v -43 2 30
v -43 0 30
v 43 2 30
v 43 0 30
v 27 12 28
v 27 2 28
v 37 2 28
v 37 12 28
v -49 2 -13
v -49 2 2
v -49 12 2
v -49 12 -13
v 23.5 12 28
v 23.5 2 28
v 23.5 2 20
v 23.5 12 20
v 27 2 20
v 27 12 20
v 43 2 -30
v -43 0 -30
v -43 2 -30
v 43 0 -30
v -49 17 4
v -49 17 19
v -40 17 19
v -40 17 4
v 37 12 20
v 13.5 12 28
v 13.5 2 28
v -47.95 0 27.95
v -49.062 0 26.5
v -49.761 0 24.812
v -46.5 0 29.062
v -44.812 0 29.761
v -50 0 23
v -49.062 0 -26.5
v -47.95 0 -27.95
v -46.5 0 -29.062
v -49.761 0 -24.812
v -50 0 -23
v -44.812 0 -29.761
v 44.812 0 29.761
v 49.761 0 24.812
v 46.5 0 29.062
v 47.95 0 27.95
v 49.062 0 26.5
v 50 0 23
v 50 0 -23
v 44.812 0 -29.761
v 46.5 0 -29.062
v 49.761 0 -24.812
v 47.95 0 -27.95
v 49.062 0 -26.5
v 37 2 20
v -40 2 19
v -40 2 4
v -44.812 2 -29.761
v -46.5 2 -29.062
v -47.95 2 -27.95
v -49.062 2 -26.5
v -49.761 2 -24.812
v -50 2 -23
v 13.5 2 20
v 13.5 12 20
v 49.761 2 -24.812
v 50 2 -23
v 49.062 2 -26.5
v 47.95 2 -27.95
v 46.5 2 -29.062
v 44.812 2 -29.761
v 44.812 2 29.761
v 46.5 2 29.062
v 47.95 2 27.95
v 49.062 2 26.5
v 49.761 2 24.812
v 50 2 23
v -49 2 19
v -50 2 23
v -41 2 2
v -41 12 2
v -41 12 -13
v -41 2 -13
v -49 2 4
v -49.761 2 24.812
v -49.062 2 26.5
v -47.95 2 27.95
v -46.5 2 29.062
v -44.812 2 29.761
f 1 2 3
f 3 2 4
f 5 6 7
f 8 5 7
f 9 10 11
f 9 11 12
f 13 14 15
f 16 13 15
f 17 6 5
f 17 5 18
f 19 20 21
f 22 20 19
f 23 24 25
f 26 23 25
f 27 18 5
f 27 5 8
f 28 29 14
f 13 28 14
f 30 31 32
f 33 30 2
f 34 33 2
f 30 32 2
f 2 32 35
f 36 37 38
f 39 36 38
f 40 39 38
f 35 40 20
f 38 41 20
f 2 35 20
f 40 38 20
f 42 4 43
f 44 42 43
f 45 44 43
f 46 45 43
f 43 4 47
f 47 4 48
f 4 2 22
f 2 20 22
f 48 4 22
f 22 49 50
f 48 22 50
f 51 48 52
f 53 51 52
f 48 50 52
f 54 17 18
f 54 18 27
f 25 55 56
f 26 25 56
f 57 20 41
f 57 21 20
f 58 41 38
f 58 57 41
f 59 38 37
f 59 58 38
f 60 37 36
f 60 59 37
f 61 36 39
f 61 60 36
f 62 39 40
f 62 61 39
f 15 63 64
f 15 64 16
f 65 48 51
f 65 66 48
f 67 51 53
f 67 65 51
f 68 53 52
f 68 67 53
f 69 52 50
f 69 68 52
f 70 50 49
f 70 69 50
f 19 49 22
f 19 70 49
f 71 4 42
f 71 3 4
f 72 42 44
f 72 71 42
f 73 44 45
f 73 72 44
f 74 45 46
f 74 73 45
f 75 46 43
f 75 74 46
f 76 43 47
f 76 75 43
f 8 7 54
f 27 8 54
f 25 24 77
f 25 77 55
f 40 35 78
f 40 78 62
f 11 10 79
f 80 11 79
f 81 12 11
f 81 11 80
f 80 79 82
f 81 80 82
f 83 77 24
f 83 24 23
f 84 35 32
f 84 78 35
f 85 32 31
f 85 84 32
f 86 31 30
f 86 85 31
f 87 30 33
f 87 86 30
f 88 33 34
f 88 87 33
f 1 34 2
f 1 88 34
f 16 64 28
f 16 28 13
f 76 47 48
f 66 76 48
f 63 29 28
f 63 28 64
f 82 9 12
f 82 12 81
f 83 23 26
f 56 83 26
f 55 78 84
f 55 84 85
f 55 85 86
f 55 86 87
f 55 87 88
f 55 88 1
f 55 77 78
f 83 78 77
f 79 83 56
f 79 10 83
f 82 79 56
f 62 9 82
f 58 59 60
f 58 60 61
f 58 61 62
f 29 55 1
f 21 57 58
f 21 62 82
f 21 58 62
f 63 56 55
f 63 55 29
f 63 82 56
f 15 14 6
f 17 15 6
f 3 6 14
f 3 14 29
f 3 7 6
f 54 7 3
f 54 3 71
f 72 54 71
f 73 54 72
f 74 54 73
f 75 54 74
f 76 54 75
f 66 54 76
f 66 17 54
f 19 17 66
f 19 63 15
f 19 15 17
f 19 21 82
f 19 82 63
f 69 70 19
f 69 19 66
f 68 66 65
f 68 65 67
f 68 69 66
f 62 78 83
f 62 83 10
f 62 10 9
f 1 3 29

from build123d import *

# Parameters (mm, degrees)
SKETCH1_W           = 100
SKETCH1_H           = 60
BOSS_EXTRUDE1_DEPTH = 2
FILLET5_R           = 7
FILLET6_R           = 7
FILLET7_R           = 7
FILLET8_R           = 7
SKETCH2_W           = 8
SKETCH2_H           = 15
BOSS_EXTRUDE2_DEPTH = 10
SKETCH3_W           = 9
SKETCH3_H           = 15
BOSS_EXTRUDE3_DEPTH = 15
SKETCH4_W           = 10
SKETCH4_H           = 8
BOSS_EXTRUDE4_DEPTH = 10


with BuildPart() as part:
    # Sketch1 → Boss-Extrude1 (new body)
    with BuildSketch(Plane(origin=(0, 0, 0), x_dir=(1, 0, 0), z_dir=(0, 1, 0))):
        Rectangle(SKETCH1_W, SKETCH1_H)
    extrude(amount=BOSS_EXTRUDE1_DEPTH)

    # Fillet5
    fillet5_edges = [part.edges().sort_by_distance(p)[0] for p in [
        (50, 1, 30),
    ]]
    fillet(fillet5_edges, radius=FILLET5_R)

    # Fillet6
    fillet6_edges = [part.edges().sort_by_distance(p)[0] for p in [
        (50, 1, -30),
    ]]
    fillet(fillet6_edges, radius=FILLET6_R)

    # Fillet7
    fillet7_edges = [part.edges().sort_by_distance(p)[0] for p in [
        (-50, 1, -30),
    ]]
    fillet(fillet7_edges, radius=FILLET7_R)

    # Fillet8
    fillet8_edges = [part.edges().sort_by_distance(p)[0] for p in [
        (-50, 1, 30),
    ]]
    fillet(fillet8_edges, radius=FILLET8_R)

    # Sketch2 → Boss-Extrude2 (add)
    with BuildSketch(Plane(origin=(0, 2, 0), x_dir=(1, 0, 0), z_dir=(0, 1, 0))):
        with Locations((-45, 5.5)):
            Rectangle(SKETCH2_W, SKETCH2_H)
    extrude(amount=BOSS_EXTRUDE2_DEPTH)

    # Sketch3 → Boss-Extrude3 (add)
    with BuildSketch(Plane(origin=(0, 2, 0), x_dir=(1, 0, 0), z_dir=(0, 1, 0))):
        with Locations((-44.5, -11.5)):
            Rectangle(SKETCH3_W, SKETCH3_H)
    extrude(amount=BOSS_EXTRUDE3_DEPTH)

    # Sketch4 → Boss-Extrude4 (add)
    with BuildSketch(Plane(origin=(0, 2, 0), x_dir=(1, 0, 0), z_dir=(0, 1, 0))):
        with Locations((32, -24)):
            Rectangle(SKETCH4_W, SKETCH4_H)
        with Locations((18.5, -24)):
            Rectangle(SKETCH4_W, SKETCH4_H)
    extrude(amount=BOSS_EXTRUDE4_DEPTH)


solid = part.part
